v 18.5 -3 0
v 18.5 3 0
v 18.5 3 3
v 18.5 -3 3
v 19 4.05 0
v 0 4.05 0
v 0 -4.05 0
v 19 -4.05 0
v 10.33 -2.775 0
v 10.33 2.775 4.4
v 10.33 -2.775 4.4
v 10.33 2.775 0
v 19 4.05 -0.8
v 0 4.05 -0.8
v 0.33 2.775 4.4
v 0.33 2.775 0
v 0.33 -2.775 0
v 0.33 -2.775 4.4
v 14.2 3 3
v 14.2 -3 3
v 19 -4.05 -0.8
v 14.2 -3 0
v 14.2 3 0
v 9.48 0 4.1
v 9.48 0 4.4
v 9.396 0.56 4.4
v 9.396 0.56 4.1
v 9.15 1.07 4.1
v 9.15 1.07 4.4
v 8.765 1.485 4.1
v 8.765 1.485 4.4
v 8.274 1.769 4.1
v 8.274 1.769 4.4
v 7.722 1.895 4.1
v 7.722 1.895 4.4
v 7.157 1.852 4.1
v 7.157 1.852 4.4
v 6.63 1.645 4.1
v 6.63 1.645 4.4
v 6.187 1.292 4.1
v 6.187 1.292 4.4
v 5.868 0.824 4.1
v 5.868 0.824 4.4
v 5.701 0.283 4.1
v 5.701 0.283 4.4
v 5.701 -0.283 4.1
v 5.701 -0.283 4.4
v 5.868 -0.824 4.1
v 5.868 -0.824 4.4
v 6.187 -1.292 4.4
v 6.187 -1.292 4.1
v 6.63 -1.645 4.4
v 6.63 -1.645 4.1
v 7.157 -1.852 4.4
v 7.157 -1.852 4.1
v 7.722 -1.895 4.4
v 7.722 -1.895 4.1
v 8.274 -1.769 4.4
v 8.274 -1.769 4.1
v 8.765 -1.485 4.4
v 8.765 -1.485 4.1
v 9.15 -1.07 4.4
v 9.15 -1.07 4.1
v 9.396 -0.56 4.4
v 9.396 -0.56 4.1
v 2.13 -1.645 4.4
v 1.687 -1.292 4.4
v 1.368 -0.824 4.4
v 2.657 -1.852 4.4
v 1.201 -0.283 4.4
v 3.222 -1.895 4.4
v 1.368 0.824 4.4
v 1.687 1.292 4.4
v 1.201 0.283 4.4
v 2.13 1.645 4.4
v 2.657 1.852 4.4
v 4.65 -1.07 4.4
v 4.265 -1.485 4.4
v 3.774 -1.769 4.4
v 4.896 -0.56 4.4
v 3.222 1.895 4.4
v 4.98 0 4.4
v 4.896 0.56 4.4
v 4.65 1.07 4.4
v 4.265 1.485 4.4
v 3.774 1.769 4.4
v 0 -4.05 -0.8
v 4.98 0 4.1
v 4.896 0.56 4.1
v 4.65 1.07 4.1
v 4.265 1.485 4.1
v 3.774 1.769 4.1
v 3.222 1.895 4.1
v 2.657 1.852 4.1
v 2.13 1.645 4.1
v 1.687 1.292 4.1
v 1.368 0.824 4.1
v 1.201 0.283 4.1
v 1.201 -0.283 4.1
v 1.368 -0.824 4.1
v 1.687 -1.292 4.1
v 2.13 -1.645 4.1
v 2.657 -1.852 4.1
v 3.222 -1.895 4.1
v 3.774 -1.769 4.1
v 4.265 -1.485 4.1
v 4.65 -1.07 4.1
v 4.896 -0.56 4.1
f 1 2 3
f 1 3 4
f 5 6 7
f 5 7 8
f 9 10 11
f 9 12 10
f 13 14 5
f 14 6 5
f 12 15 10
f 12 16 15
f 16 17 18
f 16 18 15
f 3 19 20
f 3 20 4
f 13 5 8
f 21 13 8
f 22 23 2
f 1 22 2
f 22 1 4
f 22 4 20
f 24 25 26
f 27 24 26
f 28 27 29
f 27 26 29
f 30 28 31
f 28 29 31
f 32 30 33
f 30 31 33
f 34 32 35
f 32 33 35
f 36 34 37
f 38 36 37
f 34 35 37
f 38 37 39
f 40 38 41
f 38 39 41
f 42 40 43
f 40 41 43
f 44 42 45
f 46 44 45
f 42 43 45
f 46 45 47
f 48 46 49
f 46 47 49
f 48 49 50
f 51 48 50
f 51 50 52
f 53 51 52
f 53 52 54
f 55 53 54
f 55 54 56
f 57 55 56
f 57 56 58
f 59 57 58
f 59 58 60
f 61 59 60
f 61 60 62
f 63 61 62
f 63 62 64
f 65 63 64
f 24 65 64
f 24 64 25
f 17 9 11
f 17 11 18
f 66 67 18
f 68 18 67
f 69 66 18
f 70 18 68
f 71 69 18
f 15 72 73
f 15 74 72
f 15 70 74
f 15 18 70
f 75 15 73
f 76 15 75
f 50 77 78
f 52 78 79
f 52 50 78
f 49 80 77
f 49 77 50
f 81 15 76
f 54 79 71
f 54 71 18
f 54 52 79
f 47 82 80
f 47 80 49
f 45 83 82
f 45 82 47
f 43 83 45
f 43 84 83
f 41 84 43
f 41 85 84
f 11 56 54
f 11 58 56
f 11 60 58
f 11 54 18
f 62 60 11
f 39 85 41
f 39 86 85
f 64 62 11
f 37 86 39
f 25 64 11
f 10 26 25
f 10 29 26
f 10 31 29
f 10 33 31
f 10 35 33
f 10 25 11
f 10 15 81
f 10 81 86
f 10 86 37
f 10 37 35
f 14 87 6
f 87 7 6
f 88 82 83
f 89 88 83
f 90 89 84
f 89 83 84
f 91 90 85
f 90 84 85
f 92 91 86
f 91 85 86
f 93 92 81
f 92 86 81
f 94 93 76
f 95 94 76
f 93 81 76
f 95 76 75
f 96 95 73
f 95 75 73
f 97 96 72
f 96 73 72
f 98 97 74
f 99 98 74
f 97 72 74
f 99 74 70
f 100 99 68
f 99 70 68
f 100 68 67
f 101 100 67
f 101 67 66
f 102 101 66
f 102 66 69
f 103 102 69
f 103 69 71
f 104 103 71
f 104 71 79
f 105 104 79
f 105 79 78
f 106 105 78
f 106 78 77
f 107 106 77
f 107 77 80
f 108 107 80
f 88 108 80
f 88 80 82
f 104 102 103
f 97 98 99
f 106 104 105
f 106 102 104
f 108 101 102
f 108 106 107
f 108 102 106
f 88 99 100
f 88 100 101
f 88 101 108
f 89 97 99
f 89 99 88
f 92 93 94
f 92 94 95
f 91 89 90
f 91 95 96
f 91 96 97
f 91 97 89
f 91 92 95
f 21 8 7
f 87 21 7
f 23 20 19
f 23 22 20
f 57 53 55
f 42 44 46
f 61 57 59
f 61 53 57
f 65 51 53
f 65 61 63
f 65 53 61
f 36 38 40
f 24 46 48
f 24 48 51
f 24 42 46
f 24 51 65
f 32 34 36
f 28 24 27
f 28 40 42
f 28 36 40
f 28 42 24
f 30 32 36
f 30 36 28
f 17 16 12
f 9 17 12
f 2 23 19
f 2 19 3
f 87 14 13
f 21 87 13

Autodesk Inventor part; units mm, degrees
ref_plane "YZ Plane" through (0, 0, 0) normal (1, 0, 0) x (0, 1, 0)
ref_plane "XZ Plane" through (0, 0, 0) normal (0, 1, 0) x (-1, 0, 0)
ref_plane "XY Plane" through (0, 0, 0) normal (0, 0, 1) x (1, 0, 0)
sketch "Sketch1" plane through (0, 0, 0) normal (0, 0, 1) x (1, 0, 0)
  line L0 (0, 4.05) -> (19, 4.05)
  line L1 (19, 4.05) -> (19, -4.05)
  line L2 (19, -4.05) -> (0, -4.05)
  line L3 (0, -4.05) -> (0, 4.05)
  line L4 (0, 4.05) -> (19, -4.05) construction
  line L5 (19, 4.05) -> (0, -4.05) construction
  point P0 (0, 0)
  point P1 (9.5, 0)
  point P2 (0, 0)
  dimension "d0" = 19
  dimension "d1" = 8.1
extrude "Extrusion1" add sketch "Sketch1" against normal blind 0.8
sketch "Sketch2" plane through (0, 0, 0) normal (0, 0, 1) x (1, 0, 0)
  line L0 (0.33, 2.775) -> (10.33, 2.775)
  line L1 (10.33, 2.775) -> (10.33, -2.775)
  line L2 (10.33, -2.775) -> (0.33, -2.775)
  line L3 (0.33, -2.775) -> (0.33, 2.775)
  line L4 (0.33, 2.775) -> (10.33, -2.775) construction
  line L5 (10.33, 2.775) -> (0.33, -2.775) construction
  line L6 (0, 0) -> (0.33, 0) construction
  line L7 (19, 4.05) -> (19, -4.05) construction
  line L8 (19, 0) -> (18.5, 0) construction
  line L9 (14.2, 3) -> (18.5, 3)
  line L10 (18.5, 3) -> (18.5, -3)
  line L11 (18.5, -3) -> (14.2, -3)
  line L12 (14.2, -3) -> (14.2, 3)
  line L13 (14.2, 3) -> (18.5, -3) construction
  line L14 (18.5, 3) -> (14.2, -3) construction
  point P0 (5.33, 0)
  point P1 (16.35, 0)
  dimension "d4" = 0.33
  dimension "d5" = 5.55
  dimension "d6" = 10
  dimension "d7" = 0.5
  dimension "d8" = 6
  dimension "d9" = 4.3
extrude "Extrusion2" add sketch "Sketch2" along normal blind 4.4 separate body contours L0 L1 L2 L3
extrude "Extrusion3" add sketch "Sketch2" along normal blind 3 contours L9 L10 L11 L12 bodies 2
sketch "Sketch3" plane through (0, 0, 4.4) normal (0, 0, 1) x (1, 0, 0)
  line L0 (0.33, 2.775) -> (10.33, 2.775) construction
  line L1 (5.33, 2.775) -> (5.33, -2.775) construction
  line L2 (10.33, -2.775) -> (0.33, -2.775) construction
  line L3 (0.33, 2.775) -> (0.33, -2.775) construction
  line L4 (10.33, -2.775) -> (10.33, 2.775) construction
  line L5 (3.08, 0) -> (7.58, 0) construction
  circle A0 centre (3.08, 0) radius 1.9
  circle A1 centre (7.58, 0) radius 1.9
  point P0 (0, 0)
  point P1 (5.33, 0)
  dimension "d14" = 4.5
  dimension "d15" = 3.8
  dimension "d16" = 3.8
extrude "Extrusion4" cut sketch "Sketch3" against normal blind 0.3 bodies 2
equation "\"d0\" = ir_length"
equation "\"d1\" = ir_width"
equation "\"d2\" = ir_depth"
equation "\"d4\" = ir_blockOffset"
equation "\"d5\" = ir_blockWidth"
equation "\"d6\" = ir_blockLength"
equation "\"d7\" = ir_connOffset"
equation "\"d8\" = ir_connWidth"
equation "\"d9\" = ir_connLength"
equation "\"d10\" = ir_blockDepth"
equation "\"d12\" = ir_connDepth"
equation "\"d14\" = ir_ledSpacing"
equation "\"d15\" = ir_ledDiam"
equation "\"d16\" = ir_ledDiam"
equation "\"d17\" = ir_ledDepth"
equation "\"ir_length\" = 19"
equation "\"ir_width\" = 8.1"
equation "\"ir_depth\" = 0.8"
equation "\"ir_blockLength\" = 10"
equation "\"ir_blockWidth\" = 5.55"
equation "\"ir_blockDepth\" = 4.4"
equation "\"ir_connWidth\" = 6"
equation "\"ir_connLength\" = 4.3"
equation "\"ir_connDepth\" = 3"
equation "\"ir_blockOffset\" = 0.33"
equation "\"ir_connOffset\" = 0.5"
equation "\"ir_ledDiam\" = 3.8"
equation "\"ir_ledSpacing\" = 4.5"
equation "\"ir_ledDepth\" = 0.3"
properties part number "IR Sensor"
